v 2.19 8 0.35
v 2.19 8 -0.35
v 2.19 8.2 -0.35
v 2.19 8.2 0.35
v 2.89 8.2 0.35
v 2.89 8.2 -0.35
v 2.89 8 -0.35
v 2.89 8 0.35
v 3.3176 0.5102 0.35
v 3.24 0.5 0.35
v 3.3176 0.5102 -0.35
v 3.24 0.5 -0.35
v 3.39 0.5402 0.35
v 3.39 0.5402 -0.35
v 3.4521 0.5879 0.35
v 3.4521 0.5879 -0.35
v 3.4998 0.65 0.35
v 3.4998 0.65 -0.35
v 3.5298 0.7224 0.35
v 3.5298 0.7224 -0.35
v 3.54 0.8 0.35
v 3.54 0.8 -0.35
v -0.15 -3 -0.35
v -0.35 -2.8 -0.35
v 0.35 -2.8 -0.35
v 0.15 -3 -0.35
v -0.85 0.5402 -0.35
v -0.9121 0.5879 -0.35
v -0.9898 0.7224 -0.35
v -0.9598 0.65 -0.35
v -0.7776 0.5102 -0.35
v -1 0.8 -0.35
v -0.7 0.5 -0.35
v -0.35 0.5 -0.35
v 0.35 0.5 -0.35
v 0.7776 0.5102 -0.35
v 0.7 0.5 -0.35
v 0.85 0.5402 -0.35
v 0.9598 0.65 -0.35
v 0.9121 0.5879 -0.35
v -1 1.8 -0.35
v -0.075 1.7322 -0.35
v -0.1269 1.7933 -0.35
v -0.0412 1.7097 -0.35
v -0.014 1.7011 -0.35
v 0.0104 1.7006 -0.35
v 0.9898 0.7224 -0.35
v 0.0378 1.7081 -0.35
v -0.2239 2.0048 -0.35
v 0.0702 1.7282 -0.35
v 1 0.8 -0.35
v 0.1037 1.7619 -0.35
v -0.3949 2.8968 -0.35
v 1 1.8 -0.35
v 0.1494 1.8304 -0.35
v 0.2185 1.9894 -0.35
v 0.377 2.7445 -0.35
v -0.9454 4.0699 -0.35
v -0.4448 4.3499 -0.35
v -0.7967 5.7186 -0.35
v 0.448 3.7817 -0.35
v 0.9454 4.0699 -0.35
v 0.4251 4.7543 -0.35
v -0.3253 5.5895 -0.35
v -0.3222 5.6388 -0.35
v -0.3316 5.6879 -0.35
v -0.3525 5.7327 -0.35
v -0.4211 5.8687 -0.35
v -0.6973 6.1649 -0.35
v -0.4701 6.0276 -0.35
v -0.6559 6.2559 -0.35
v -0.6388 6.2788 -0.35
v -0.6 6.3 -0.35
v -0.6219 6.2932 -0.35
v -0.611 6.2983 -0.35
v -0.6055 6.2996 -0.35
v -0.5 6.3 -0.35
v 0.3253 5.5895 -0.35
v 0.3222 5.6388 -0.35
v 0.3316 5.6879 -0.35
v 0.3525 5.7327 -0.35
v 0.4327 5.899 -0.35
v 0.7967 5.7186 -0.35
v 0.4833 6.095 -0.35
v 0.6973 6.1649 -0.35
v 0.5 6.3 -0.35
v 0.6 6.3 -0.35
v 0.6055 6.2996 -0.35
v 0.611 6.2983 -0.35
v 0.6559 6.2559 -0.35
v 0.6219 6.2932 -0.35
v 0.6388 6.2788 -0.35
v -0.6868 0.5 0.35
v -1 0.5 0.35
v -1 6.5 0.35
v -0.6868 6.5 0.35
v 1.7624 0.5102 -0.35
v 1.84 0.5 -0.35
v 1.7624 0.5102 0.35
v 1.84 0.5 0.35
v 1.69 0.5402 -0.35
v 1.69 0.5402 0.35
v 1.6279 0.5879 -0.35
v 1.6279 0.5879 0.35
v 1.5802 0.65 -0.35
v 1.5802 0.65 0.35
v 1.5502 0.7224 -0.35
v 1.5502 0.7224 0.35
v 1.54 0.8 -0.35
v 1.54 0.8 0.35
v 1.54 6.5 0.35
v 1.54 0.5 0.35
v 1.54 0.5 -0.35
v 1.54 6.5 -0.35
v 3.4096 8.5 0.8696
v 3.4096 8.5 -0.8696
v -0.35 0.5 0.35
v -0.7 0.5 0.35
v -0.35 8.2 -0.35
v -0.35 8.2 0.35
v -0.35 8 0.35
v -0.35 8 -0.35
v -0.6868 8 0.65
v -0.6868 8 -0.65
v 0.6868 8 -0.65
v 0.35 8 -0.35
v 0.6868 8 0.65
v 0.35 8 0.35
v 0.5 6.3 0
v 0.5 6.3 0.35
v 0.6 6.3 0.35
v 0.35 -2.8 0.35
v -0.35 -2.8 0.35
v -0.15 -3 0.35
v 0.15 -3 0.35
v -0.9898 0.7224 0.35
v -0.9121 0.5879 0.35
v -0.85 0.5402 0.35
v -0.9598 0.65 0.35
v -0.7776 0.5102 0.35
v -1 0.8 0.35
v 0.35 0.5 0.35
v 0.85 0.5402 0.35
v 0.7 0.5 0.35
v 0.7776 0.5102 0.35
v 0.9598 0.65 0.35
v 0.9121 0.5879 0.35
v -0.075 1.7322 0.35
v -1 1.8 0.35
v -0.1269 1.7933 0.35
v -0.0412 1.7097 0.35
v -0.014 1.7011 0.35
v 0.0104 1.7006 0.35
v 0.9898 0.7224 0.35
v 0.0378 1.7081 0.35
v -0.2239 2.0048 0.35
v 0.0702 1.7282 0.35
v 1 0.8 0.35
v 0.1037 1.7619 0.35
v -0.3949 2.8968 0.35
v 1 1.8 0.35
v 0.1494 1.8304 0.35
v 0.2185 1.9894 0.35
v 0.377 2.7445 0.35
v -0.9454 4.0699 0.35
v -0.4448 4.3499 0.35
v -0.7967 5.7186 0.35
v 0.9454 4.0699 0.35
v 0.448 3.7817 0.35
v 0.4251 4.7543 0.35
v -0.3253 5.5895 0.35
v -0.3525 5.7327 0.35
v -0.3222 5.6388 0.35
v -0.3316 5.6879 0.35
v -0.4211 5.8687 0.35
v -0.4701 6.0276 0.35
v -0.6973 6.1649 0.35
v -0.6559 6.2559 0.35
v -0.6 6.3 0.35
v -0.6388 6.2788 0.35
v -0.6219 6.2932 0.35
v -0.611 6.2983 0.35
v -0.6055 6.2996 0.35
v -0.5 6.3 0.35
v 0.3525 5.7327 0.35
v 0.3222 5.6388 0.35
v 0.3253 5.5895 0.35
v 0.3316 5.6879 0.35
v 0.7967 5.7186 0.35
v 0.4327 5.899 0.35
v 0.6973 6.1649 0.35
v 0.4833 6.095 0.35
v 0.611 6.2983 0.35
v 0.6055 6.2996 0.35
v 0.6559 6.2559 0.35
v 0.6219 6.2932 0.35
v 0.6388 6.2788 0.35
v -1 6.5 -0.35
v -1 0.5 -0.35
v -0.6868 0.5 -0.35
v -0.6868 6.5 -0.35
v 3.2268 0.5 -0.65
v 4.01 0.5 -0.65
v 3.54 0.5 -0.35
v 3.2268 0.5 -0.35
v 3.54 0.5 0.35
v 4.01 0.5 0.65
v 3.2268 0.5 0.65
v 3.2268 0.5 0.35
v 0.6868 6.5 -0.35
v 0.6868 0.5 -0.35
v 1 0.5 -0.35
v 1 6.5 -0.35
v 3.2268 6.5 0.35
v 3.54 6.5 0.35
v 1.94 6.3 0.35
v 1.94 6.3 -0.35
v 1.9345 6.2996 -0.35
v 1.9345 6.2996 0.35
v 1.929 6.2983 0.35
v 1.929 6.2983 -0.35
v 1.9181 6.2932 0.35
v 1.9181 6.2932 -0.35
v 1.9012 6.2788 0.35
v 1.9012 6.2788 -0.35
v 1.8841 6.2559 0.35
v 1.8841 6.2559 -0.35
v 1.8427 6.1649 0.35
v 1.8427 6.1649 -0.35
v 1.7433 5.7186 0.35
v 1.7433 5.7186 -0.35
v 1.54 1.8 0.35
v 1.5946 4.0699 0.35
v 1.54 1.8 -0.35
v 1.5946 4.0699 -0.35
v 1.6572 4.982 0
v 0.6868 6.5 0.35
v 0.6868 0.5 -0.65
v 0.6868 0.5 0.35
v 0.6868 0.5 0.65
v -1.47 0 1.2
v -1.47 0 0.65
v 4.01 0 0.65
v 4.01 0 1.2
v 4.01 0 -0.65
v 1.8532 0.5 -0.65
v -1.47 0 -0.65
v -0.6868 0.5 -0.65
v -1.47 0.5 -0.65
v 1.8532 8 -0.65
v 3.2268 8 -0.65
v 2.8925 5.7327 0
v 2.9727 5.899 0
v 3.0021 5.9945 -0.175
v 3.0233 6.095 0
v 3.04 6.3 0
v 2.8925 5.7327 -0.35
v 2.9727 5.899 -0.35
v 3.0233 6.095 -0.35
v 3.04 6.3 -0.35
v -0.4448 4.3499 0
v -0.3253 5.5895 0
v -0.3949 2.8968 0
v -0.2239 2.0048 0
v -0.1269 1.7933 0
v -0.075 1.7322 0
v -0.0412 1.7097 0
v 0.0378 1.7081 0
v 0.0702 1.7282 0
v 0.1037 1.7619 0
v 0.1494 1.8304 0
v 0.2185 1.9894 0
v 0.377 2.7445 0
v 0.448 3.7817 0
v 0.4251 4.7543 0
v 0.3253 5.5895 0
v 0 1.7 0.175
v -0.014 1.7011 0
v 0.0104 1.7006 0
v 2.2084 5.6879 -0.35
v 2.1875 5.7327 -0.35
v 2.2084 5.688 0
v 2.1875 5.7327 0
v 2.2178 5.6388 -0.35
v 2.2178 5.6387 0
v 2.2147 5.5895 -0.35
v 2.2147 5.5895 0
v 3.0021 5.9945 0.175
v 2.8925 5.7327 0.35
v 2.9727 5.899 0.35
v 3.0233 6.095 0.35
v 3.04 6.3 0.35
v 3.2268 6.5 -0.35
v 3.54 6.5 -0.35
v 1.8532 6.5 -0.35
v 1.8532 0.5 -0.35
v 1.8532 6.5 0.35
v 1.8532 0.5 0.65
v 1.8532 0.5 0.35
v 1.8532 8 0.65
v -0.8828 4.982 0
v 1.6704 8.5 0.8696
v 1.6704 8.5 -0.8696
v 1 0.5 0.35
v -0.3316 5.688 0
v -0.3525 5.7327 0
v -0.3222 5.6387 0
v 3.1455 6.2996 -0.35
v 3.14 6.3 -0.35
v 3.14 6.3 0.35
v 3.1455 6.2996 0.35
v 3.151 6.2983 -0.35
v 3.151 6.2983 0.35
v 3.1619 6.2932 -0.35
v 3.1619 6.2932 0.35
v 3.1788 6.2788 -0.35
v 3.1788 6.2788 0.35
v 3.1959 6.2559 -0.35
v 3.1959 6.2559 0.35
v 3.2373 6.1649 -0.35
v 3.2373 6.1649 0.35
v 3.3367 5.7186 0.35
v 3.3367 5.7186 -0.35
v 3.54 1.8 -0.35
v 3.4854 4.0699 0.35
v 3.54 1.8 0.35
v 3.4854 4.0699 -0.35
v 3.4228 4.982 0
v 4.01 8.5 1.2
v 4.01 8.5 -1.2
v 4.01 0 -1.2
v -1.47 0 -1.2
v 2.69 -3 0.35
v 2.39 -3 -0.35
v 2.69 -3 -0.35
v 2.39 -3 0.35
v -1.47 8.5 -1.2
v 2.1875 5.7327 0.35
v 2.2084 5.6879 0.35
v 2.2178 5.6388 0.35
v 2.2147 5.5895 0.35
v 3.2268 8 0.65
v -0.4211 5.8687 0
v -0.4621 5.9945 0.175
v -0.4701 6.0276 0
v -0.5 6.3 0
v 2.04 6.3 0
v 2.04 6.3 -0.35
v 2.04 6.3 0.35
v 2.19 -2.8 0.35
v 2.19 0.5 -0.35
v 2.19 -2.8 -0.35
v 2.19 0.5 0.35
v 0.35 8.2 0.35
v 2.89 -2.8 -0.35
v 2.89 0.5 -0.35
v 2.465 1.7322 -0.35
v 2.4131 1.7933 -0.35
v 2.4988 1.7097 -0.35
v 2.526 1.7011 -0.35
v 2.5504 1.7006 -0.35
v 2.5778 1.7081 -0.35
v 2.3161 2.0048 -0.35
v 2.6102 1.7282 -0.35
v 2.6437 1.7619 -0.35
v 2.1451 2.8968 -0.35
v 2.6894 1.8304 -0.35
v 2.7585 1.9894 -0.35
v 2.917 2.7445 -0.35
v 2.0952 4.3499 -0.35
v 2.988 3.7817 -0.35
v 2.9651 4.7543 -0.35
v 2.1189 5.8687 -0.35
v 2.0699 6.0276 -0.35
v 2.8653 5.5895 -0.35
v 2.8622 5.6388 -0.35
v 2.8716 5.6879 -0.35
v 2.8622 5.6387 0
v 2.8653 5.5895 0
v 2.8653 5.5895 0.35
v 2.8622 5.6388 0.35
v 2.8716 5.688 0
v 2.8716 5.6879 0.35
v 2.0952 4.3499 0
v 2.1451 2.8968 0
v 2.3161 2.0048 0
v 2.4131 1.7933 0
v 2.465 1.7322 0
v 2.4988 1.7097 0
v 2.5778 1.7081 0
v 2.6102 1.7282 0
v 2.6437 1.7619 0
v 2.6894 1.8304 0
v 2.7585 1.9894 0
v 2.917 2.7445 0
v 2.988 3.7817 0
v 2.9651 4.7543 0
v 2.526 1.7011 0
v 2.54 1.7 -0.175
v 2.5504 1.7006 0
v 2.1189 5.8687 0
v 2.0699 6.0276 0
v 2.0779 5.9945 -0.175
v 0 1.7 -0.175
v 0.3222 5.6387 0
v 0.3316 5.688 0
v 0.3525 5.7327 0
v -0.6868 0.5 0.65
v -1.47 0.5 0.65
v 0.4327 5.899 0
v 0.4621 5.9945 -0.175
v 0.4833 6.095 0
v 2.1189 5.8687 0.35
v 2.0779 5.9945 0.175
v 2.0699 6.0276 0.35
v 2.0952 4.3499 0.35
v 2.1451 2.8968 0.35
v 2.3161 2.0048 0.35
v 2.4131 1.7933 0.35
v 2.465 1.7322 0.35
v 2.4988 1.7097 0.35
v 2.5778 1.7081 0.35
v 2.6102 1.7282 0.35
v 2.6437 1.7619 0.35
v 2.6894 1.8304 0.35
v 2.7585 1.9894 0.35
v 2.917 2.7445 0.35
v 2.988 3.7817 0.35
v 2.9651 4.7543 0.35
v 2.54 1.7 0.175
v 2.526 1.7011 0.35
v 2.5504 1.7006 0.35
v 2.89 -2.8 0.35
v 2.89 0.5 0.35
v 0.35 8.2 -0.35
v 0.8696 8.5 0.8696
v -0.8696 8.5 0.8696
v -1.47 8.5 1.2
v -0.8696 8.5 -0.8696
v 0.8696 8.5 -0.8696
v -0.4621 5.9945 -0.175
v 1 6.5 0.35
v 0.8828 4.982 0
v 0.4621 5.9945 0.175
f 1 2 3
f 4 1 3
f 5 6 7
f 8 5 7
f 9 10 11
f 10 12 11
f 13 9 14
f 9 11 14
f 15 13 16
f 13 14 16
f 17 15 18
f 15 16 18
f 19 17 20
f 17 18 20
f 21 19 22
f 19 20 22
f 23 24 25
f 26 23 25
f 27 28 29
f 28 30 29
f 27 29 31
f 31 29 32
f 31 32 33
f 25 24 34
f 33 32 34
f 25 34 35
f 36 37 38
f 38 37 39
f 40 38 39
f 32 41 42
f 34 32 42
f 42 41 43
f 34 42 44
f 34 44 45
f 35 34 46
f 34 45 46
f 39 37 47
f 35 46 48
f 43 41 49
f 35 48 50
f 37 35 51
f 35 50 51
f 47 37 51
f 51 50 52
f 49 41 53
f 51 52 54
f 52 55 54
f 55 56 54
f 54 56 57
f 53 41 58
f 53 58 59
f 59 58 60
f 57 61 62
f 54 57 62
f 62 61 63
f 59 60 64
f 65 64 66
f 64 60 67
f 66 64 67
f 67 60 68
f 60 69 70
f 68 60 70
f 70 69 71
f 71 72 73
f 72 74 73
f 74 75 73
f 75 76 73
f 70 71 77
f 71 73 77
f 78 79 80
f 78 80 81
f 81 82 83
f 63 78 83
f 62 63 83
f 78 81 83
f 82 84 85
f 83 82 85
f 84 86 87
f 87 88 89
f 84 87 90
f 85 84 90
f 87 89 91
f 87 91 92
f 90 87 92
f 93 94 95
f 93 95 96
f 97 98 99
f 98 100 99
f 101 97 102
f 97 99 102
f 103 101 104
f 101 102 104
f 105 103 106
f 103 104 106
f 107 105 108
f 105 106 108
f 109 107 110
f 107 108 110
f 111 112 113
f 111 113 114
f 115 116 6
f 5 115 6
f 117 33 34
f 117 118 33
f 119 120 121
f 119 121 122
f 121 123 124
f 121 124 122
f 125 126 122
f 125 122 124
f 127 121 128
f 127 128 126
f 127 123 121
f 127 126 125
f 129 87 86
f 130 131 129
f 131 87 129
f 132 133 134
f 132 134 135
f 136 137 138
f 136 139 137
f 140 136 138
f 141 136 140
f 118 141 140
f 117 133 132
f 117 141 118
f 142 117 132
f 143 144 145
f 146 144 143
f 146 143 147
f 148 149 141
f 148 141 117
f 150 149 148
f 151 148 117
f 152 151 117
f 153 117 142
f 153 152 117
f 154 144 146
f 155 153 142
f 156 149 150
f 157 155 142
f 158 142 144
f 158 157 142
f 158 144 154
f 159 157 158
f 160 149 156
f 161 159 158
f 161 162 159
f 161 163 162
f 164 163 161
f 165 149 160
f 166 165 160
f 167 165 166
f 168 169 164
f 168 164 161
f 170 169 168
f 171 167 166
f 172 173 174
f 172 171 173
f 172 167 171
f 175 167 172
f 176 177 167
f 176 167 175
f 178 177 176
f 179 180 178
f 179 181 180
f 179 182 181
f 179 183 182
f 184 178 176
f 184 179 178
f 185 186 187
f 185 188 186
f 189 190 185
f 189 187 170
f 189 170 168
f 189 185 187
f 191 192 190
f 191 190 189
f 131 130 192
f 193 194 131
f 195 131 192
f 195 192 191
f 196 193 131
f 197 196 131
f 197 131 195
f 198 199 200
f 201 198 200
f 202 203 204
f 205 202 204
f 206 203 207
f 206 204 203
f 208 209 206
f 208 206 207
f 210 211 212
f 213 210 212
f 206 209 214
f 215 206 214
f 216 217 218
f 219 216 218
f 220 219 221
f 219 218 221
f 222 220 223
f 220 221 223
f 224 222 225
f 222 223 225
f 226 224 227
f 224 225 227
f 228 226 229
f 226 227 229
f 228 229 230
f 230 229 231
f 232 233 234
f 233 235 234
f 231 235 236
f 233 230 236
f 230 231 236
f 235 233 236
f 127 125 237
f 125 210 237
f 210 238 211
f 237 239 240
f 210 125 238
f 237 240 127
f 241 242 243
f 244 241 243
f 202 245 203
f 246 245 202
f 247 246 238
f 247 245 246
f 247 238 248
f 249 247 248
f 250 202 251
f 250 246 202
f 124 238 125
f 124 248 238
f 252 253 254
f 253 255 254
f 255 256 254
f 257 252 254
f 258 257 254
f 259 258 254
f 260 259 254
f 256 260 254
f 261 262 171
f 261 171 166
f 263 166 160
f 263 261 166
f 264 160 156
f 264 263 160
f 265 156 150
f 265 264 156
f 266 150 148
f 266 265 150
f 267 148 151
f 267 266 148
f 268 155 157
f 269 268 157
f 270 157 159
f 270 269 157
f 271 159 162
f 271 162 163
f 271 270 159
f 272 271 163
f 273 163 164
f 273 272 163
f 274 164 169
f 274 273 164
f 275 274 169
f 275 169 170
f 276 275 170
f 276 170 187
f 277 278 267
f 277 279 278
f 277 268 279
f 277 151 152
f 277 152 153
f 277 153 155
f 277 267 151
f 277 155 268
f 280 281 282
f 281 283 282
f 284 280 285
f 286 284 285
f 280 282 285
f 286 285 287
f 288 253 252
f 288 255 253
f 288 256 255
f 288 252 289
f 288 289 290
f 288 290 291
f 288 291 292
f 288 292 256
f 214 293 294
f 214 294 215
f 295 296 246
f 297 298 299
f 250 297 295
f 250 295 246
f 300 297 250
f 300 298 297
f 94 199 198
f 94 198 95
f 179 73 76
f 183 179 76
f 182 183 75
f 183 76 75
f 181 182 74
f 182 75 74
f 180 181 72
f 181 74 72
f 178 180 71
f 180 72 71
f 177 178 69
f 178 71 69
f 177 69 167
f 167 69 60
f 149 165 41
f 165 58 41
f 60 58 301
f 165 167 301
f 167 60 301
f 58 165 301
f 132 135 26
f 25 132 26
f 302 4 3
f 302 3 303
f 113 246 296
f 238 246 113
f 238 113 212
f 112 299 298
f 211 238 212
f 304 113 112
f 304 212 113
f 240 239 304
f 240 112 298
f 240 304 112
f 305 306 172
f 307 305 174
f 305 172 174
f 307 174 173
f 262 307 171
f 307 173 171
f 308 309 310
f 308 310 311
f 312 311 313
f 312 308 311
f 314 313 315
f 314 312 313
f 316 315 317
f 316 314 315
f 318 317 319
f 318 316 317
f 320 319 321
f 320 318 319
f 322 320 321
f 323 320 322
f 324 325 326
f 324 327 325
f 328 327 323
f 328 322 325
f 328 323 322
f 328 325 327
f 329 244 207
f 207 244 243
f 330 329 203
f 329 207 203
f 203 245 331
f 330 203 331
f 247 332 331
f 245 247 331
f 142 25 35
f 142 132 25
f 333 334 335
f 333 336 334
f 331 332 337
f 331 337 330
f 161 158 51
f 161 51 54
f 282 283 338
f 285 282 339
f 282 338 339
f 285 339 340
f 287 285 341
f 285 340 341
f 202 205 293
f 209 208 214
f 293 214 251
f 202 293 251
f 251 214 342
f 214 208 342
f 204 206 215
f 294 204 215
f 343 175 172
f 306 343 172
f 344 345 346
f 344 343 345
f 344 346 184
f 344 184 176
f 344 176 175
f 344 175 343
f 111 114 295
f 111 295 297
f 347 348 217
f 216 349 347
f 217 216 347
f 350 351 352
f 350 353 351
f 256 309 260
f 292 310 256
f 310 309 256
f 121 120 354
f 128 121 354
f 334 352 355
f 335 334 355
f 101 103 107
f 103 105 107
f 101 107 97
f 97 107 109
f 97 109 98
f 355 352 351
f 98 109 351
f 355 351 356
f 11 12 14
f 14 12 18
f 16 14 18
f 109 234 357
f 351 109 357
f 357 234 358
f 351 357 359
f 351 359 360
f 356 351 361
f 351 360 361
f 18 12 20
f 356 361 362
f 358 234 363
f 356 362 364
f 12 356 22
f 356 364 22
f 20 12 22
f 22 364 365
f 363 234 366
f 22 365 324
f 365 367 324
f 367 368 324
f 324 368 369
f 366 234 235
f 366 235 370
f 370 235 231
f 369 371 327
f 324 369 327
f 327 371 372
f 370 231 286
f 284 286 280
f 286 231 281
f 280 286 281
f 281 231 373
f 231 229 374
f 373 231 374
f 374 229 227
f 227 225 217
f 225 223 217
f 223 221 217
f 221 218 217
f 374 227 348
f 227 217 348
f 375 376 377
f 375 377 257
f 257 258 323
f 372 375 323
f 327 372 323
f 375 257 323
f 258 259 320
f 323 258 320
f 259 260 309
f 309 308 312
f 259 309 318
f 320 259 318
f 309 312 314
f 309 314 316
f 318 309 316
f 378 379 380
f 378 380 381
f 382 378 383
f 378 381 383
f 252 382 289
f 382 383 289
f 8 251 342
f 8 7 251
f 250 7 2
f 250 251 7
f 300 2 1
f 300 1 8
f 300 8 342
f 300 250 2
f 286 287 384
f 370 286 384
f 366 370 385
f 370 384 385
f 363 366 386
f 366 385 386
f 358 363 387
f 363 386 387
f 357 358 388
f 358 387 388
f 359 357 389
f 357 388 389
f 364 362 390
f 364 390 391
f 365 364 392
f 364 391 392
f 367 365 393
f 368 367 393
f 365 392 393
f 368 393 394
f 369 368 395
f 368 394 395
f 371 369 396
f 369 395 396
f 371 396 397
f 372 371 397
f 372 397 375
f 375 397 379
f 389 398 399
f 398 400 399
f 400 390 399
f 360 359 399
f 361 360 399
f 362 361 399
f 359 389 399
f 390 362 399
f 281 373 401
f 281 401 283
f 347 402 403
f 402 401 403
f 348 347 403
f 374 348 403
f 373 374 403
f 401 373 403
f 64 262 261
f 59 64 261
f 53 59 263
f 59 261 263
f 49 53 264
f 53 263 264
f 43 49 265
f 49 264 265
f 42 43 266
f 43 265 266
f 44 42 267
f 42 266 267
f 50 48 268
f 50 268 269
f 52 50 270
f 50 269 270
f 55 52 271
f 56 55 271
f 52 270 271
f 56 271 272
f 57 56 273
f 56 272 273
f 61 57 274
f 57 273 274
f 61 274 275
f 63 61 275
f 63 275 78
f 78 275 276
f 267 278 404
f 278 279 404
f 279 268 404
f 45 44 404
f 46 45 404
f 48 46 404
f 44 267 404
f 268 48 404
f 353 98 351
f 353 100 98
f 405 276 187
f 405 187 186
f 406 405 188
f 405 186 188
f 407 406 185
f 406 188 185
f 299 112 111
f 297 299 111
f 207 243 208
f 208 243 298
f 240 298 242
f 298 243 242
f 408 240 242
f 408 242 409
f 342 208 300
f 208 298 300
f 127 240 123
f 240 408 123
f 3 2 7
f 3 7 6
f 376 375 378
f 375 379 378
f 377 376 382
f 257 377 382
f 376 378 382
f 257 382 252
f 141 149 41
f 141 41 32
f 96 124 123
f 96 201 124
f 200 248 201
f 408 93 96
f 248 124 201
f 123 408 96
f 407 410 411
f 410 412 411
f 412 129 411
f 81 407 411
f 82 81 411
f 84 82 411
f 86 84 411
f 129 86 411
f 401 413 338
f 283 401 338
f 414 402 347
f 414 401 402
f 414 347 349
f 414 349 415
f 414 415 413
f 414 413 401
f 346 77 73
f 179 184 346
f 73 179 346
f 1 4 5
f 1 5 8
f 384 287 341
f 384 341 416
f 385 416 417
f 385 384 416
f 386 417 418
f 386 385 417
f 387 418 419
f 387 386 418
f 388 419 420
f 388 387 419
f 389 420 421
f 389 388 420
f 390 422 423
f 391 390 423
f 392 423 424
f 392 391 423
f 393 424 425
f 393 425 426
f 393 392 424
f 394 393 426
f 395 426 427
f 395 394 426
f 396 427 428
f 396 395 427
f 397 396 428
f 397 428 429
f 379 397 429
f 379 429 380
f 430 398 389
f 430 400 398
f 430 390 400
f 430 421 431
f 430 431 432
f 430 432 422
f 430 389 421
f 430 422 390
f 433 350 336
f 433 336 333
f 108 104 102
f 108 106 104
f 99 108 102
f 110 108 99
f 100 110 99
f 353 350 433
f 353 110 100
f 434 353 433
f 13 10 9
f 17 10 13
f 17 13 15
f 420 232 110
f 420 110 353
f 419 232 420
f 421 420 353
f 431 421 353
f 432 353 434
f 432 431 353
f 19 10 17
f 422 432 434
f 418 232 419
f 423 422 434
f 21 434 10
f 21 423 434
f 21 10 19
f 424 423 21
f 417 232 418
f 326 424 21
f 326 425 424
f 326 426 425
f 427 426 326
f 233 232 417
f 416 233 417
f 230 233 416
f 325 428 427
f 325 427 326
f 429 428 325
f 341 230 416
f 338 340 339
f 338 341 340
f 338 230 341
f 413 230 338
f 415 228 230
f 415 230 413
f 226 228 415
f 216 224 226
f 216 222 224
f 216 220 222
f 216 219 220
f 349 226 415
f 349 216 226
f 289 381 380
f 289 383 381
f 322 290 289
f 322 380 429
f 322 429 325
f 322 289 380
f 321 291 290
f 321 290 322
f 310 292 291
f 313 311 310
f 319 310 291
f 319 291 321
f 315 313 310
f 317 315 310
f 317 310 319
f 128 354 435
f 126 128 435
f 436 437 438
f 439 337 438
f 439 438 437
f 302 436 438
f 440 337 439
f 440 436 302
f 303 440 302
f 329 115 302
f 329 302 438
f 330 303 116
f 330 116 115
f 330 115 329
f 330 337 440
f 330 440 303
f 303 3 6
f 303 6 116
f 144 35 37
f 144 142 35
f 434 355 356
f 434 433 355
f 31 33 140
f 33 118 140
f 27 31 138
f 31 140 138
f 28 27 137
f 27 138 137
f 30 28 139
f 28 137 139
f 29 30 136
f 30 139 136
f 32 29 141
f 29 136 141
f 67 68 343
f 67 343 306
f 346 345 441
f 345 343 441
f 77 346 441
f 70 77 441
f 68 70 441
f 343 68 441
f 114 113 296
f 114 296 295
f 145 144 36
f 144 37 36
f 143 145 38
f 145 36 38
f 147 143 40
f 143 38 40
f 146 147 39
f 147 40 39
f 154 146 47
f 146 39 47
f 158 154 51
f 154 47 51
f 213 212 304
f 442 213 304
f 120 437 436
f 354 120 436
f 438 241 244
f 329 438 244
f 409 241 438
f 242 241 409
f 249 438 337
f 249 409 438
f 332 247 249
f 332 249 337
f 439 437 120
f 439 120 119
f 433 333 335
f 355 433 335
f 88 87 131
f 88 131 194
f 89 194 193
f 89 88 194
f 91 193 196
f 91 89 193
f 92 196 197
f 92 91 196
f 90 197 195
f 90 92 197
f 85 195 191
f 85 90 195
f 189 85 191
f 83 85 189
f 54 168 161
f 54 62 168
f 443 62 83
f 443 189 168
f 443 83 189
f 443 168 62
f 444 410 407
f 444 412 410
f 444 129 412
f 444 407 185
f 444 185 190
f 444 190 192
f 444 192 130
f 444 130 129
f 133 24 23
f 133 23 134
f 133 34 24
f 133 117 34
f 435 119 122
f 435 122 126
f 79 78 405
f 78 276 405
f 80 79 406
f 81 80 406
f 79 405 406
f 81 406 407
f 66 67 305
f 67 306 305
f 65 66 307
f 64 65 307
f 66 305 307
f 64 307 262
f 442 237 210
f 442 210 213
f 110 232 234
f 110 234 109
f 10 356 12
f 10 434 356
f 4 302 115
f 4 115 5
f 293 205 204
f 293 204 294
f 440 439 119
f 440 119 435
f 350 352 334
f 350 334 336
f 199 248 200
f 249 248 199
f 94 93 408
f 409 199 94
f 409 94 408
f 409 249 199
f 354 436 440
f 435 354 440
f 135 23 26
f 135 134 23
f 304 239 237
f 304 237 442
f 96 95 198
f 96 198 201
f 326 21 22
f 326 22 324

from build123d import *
from OCP.BRepFilletAPI import BRepFilletAPI_MakeChamfer

# Parameters (mm, degrees)
SKETCH8_W              = 5.48
SKETCH8_H              = 2.4
BOSS_EXTRUDE3_DEPTH    = 8.5
SKETCH9_W              = 1.3
SKETCH9_H              = 0.5
CUT_EXTRUDE5_DEPTH     = 11.184321283
SKETCH13_W             = 0.7
SKETCH13_H             = 0.7
CUT_EXTRUDE8_DEPTH     = 10.474708439
CHAMFER4_SIZE          = 0.3
CHAMFER4_SIZE2         = 0.519615242
SKETCH10_W             = 1.373509866
SKETCH10_H             = 1.3
CUT_EXTRUDE6_DEPTH     = 7.5
SKETCH11_W             = 2
SKETCH11_H             = 0.7
CUT_EXTRUDE7_DEPTH     = 6
BOSS_EXTRUDE4_DEPTH    = 0.35
FILLET1_R              = 0.2
FILLET2_SIZE           = 0.4
FILLET2_SIZE_2         = 4.5
CHAMFER5_SIZE          = 0.2
FILLET3_R              = 0.3
LPATTERN17_START       = 1.853245067
LPATTERN17_DEPTH       = 1.373509866
LPATTERN17_START_2     = 1.54
LPATTERN17_2_OUTLINE_W = 6
LPATTERN17_2_OUTLINE_H = 0.7
LPATTERN17_2_DEPTH     = 2
LPATTERN17_START_3     = 1.670384758
LPATTERN17_3_DEPTH     = 1.739230484
LPATTERN17_START_4     = -0.869615242
LPATTERN17_4_DEPTH     = 1.739230484
LPATTERN18_COUNT       = 2
LPATTERN18_PITCH       = 2.54


with BuildPart() as part:
    # Sketch8 → Boss-Extrude3 (new body)
    with BuildSketch(Plane(origin=(0, 0, 0), x_dir=(1, 0, 0), z_dir=(0, 1, 0))):
        with Locations((1.27, 0)):
            Rectangle(SKETCH8_W, SKETCH8_H)
    extrude(amount=BOSS_EXTRUDE3_DEPTH)

    # Sketch9 → Cut-Extrude5 (cut, through all)
    with BuildSketch(Plane.ZY.offset(1.47)):
        with Locations((0, 0.25)):
            Rectangle(SKETCH9_W, SKETCH9_H)
    extrude(amount=-CUT_EXTRUDE5_DEPTH, mode=Mode.SUBTRACT)

    # Sketch13 → Cut-Extrude8 (cut, through all)
    with BuildSketch(Plane(origin=(0, 8.5, 0), x_dir=(1, 0, 0), z_dir=(0, 1, 0))):
        Rectangle(SKETCH13_W, SKETCH13_H)
    extrude(amount=-CUT_EXTRUDE8_DEPTH, mode=Mode.SUBTRACT)

    # Chamfer4: one chamfer whose edges measure the first distance from different faces: ONE call of the kernel's chamfer builder (chamfer() names one face for all edges)
    chamfer4_edges_1 = [part.edges().sort_by_distance(p)[0] for p in [
        (0.35, 8.5, 0),
    ]]
    chamfer4_side_1 = [part.faces().sort_by_distance(p)[0] for p in [
        (0.35, 4.5, 0),
    ]]
    chamfer4_edges_2 = [part.edges().sort_by_distance(p)[0] for p in [
        (0, 8.5, -0.35),
    ]]
    chamfer4_side_2 = [part.faces().sort_by_distance(p)[0] for p in [
        (0, 4.5, -0.35),
    ]]
    chamfer4_edges_3 = [part.edges().sort_by_distance(p)[0] for p in [
        (-0.35, 8.5, 0),
    ]]
    chamfer4_side_3 = [part.faces().sort_by_distance(p)[0] for p in [
        (-0.35, 4.5, 0),
    ]]
    chamfer4_edges_4 = [part.edges().sort_by_distance(p)[0] for p in [
        (0, 8.5, 0.35),
    ]]
    chamfer4_side_4 = [part.faces().sort_by_distance(p)[0] for p in [
        (0, 4.5, 0.35),
    ]]
    chamfer4 = BRepFilletAPI_MakeChamfer(part.part.solid().wrapped)
    for e in chamfer4_edges_1:
        chamfer4.Add(CHAMFER4_SIZE, CHAMFER4_SIZE2, e.wrapped, chamfer4_side_1[0].wrapped)  # the first distance lies on this face
    for e in chamfer4_edges_2:
        chamfer4.Add(CHAMFER4_SIZE, CHAMFER4_SIZE2, e.wrapped, chamfer4_side_2[0].wrapped)  # the first distance lies on this face
    for e in chamfer4_edges_3:
        chamfer4.Add(CHAMFER4_SIZE, CHAMFER4_SIZE2, e.wrapped, chamfer4_side_3[0].wrapped)  # the first distance lies on this face
    for e in chamfer4_edges_4:
        chamfer4.Add(CHAMFER4_SIZE, CHAMFER4_SIZE2, e.wrapped, chamfer4_side_4[0].wrapped)  # the first distance lies on this face
    add(Compound.cast(chamfer4.Shape()), mode=Mode.REPLACE)

    # Sketch10 → Cut-Extrude6 (cut)
    with BuildSketch(Plane.XZ.offset(-0.5)):
        Rectangle(SKETCH10_W, SKETCH10_H)
    extrude(amount=-CUT_EXTRUDE6_DEPTH, mode=Mode.SUBTRACT)

    # Sketch11 → Cut-Extrude7 (cut)
    with BuildSketch(Plane.XZ.offset(-0.5)):
        Rectangle(SKETCH11_W, SKETCH11_H)
    extrude(amount=-CUT_EXTRUDE7_DEPTH, mode=Mode.SUBTRACT)

    # LPattern17: read off the stored shape, not the designer's step
    # LPattern17 outline → LPattern17 (cut)
    with BuildSketch(Plane.YZ.offset(LPATTERN17_START)):
        Polygon((8.5, 0.869615242), (8.2, 0.35), (8, 0.35), (8, 0.65), (0.5, 0.65), (0.5, -0.65), (8, -0.65), (8, -0.35), (8.2, -0.35), (8.5, -0.869615242), align=None)
    extrude(amount=LPATTERN17_DEPTH, mode=Mode.SUBTRACT)

    # LPattern17 2 outline → LPattern17 2 (cut)
    with BuildSketch(Plane.YZ.offset(LPATTERN17_START_2)):
        with Locations((3.5, 0)):
            Rectangle(LPATTERN17_2_OUTLINE_W, LPATTERN17_2_OUTLINE_H)
    extrude(amount=LPATTERN17_2_DEPTH, mode=Mode.SUBTRACT)

    # LPattern17 3 outline → LPattern17 3 (cut)
    with BuildSketch(Plane.YZ.offset(LPATTERN17_START_3)):
        Polygon((8.5, 0.869615242), (8.2, 0.35), (8, 0.35), (8, -0.35), (8.2, -0.35), (8.5, -0.869615242), align=None)
    extrude(amount=LPATTERN17_3_DEPTH, mode=Mode.SUBTRACT)

    # LPattern17 4 outline → LPattern17 4 (add)
    with BuildSketch(Plane.XY.offset(LPATTERN17_START_4)):
        Polygon((1.670384758, 8), (2.19, 8), (2.19, 8.2), (1.670384758, 8.5), align=None)
        Polygon((2.89, 8.2), (2.89, 8), (3.409615242, 8), (3.409615242, 8.5), align=None)
    extrude(amount=LPATTERN17_4_DEPTH)


with BuildPart() as body_2:
    # Sketch12 → Boss-Extrude4 (new, symmetric)
    with BuildSketch(Plane.XY):
        with BuildLine():
            Line((1, 0.5), (1, 6.3))
            Line((1, 6.3), (0.5, 6.3))
            add(Edge.make_bspline(
                [(0.309160803, 5.671259854), (0.5, 5.911486281), (0.5, 6.3)],
                knots=[3.808197993, 3.808197993, 3.808197993, 4.71238898, 4.71238898, 4.71238898], degree=2, weights=[1, 0.899533658, 1]))
            add(Edge.make_bspline(
                [(-0.309160803, 5.671259854), (-1.130943922, 1.7), (0, 1.7), (1.130943922, 1.7), (0.309160803, 5.671259854)],
                knots=[0.757385496, 0.757385496, 0.757385496, 3.141592654, 3.141592654, 5.525799811, 5.525799811, 5.525799811], degree=2, weights=[1, 0.369706154, 1, 0.369706154, 1]))
            add(Edge.make_bspline(
                [(-0.5, 6.3), (-0.5, 5.911486281), (-0.309160803, 5.671259854)],
                knots=[1.570796327, 1.570796327, 1.570796327, 2.474987314, 2.474987314, 2.474987314], degree=2, weights=[1, 0.899533658, 1]))
            Line((-0.5, 6.3), (-1, 6.3))
            Line((-1, 6.3), (-1, 0.5))
            Line((-1, 0.5), (-0.35, 0.5))
            Line((-0.35, 0.5), (-0.35, -3))
            Line((-0.35, -3), (0.35, -3))
            Line((0.35, -3), (0.35, 0.5))
            Line((0.35, 0.5), (1, 0.5))
        make_face()
    extrude(amount=BOSS_EXTRUDE4_DEPTH, both=True)

    # Fillet1
    fillet1_edges = [body_2.edges().sort_by_distance(p)[0] for p in [
        (-0.309160803, 5.671259854, 0.175),
        (0.309160803, 5.671259854, 0.175),
    ]]
    fillet(fillet1_edges, radius=FILLET1_R)

    # Fillet2
    # a fillet whose section is not a circle: 4.5, 0.4 mm, written as the material it takes off along each edge
    with BuildSketch(Plane(origin=(-1, 6.3, -11.6), x_dir=(1, 0, 0), z_dir=(0, 0, 1))) as fillet2_piece_1:
        with BuildLine():
            Bezier((FILLET2_SIZE, 0), (0, 0), (0, -FILLET2_SIZE_2), weights=[1, 0.707106781, 1])
            Line((0, -FILLET2_SIZE_2), (0, 0))
            Line((0, 0), (FILLET2_SIZE, 0))
        make_face()
    extrude(amount=23.2, mode=Mode.SUBTRACT)
    with BuildSketch(Plane(origin=(1, 6.3, -11.6), x_dir=(-1, 0, 0), z_dir=(0, 0, 1))) as fillet2_piece_2:
        with BuildLine():
            Bezier((FILLET2_SIZE, 0), (0, 0), (0, FILLET2_SIZE_2), weights=[1, 0.707106781, 1])
            Line((0, FILLET2_SIZE_2), (0, 0))
            Line((0, 0), (FILLET2_SIZE, 0))
        make_face()
    extrude(amount=23.2, mode=Mode.SUBTRACT)

    # Chamfer5
    chamfer5_edges = [body_2.edges().sort_by_distance(p)[0] for p in [
        (0.35, -3, 0),
        (-0.35, -3, 0),
    ]]
    chamfer(chamfer5_edges, length=CHAMFER5_SIZE)

    # Fillet3
    fillet3_edges = [body_2.edges().sort_by_distance(p)[0] for p in [
        (1, 0.5, 0),
        (-1, 0.5, 0),
    ]]
    fillet(fillet3_edges, radius=FILLET3_R)


with BuildPart() as lpattern18_1:
    # LPattern18: pattern copy
    add(body_2.part.moved(Location(Vector(1, 0, 0) * (1 * LPATTERN18_PITCH))))


solid = Compound([part.part, body_2.part, lpattern18_1.part])
